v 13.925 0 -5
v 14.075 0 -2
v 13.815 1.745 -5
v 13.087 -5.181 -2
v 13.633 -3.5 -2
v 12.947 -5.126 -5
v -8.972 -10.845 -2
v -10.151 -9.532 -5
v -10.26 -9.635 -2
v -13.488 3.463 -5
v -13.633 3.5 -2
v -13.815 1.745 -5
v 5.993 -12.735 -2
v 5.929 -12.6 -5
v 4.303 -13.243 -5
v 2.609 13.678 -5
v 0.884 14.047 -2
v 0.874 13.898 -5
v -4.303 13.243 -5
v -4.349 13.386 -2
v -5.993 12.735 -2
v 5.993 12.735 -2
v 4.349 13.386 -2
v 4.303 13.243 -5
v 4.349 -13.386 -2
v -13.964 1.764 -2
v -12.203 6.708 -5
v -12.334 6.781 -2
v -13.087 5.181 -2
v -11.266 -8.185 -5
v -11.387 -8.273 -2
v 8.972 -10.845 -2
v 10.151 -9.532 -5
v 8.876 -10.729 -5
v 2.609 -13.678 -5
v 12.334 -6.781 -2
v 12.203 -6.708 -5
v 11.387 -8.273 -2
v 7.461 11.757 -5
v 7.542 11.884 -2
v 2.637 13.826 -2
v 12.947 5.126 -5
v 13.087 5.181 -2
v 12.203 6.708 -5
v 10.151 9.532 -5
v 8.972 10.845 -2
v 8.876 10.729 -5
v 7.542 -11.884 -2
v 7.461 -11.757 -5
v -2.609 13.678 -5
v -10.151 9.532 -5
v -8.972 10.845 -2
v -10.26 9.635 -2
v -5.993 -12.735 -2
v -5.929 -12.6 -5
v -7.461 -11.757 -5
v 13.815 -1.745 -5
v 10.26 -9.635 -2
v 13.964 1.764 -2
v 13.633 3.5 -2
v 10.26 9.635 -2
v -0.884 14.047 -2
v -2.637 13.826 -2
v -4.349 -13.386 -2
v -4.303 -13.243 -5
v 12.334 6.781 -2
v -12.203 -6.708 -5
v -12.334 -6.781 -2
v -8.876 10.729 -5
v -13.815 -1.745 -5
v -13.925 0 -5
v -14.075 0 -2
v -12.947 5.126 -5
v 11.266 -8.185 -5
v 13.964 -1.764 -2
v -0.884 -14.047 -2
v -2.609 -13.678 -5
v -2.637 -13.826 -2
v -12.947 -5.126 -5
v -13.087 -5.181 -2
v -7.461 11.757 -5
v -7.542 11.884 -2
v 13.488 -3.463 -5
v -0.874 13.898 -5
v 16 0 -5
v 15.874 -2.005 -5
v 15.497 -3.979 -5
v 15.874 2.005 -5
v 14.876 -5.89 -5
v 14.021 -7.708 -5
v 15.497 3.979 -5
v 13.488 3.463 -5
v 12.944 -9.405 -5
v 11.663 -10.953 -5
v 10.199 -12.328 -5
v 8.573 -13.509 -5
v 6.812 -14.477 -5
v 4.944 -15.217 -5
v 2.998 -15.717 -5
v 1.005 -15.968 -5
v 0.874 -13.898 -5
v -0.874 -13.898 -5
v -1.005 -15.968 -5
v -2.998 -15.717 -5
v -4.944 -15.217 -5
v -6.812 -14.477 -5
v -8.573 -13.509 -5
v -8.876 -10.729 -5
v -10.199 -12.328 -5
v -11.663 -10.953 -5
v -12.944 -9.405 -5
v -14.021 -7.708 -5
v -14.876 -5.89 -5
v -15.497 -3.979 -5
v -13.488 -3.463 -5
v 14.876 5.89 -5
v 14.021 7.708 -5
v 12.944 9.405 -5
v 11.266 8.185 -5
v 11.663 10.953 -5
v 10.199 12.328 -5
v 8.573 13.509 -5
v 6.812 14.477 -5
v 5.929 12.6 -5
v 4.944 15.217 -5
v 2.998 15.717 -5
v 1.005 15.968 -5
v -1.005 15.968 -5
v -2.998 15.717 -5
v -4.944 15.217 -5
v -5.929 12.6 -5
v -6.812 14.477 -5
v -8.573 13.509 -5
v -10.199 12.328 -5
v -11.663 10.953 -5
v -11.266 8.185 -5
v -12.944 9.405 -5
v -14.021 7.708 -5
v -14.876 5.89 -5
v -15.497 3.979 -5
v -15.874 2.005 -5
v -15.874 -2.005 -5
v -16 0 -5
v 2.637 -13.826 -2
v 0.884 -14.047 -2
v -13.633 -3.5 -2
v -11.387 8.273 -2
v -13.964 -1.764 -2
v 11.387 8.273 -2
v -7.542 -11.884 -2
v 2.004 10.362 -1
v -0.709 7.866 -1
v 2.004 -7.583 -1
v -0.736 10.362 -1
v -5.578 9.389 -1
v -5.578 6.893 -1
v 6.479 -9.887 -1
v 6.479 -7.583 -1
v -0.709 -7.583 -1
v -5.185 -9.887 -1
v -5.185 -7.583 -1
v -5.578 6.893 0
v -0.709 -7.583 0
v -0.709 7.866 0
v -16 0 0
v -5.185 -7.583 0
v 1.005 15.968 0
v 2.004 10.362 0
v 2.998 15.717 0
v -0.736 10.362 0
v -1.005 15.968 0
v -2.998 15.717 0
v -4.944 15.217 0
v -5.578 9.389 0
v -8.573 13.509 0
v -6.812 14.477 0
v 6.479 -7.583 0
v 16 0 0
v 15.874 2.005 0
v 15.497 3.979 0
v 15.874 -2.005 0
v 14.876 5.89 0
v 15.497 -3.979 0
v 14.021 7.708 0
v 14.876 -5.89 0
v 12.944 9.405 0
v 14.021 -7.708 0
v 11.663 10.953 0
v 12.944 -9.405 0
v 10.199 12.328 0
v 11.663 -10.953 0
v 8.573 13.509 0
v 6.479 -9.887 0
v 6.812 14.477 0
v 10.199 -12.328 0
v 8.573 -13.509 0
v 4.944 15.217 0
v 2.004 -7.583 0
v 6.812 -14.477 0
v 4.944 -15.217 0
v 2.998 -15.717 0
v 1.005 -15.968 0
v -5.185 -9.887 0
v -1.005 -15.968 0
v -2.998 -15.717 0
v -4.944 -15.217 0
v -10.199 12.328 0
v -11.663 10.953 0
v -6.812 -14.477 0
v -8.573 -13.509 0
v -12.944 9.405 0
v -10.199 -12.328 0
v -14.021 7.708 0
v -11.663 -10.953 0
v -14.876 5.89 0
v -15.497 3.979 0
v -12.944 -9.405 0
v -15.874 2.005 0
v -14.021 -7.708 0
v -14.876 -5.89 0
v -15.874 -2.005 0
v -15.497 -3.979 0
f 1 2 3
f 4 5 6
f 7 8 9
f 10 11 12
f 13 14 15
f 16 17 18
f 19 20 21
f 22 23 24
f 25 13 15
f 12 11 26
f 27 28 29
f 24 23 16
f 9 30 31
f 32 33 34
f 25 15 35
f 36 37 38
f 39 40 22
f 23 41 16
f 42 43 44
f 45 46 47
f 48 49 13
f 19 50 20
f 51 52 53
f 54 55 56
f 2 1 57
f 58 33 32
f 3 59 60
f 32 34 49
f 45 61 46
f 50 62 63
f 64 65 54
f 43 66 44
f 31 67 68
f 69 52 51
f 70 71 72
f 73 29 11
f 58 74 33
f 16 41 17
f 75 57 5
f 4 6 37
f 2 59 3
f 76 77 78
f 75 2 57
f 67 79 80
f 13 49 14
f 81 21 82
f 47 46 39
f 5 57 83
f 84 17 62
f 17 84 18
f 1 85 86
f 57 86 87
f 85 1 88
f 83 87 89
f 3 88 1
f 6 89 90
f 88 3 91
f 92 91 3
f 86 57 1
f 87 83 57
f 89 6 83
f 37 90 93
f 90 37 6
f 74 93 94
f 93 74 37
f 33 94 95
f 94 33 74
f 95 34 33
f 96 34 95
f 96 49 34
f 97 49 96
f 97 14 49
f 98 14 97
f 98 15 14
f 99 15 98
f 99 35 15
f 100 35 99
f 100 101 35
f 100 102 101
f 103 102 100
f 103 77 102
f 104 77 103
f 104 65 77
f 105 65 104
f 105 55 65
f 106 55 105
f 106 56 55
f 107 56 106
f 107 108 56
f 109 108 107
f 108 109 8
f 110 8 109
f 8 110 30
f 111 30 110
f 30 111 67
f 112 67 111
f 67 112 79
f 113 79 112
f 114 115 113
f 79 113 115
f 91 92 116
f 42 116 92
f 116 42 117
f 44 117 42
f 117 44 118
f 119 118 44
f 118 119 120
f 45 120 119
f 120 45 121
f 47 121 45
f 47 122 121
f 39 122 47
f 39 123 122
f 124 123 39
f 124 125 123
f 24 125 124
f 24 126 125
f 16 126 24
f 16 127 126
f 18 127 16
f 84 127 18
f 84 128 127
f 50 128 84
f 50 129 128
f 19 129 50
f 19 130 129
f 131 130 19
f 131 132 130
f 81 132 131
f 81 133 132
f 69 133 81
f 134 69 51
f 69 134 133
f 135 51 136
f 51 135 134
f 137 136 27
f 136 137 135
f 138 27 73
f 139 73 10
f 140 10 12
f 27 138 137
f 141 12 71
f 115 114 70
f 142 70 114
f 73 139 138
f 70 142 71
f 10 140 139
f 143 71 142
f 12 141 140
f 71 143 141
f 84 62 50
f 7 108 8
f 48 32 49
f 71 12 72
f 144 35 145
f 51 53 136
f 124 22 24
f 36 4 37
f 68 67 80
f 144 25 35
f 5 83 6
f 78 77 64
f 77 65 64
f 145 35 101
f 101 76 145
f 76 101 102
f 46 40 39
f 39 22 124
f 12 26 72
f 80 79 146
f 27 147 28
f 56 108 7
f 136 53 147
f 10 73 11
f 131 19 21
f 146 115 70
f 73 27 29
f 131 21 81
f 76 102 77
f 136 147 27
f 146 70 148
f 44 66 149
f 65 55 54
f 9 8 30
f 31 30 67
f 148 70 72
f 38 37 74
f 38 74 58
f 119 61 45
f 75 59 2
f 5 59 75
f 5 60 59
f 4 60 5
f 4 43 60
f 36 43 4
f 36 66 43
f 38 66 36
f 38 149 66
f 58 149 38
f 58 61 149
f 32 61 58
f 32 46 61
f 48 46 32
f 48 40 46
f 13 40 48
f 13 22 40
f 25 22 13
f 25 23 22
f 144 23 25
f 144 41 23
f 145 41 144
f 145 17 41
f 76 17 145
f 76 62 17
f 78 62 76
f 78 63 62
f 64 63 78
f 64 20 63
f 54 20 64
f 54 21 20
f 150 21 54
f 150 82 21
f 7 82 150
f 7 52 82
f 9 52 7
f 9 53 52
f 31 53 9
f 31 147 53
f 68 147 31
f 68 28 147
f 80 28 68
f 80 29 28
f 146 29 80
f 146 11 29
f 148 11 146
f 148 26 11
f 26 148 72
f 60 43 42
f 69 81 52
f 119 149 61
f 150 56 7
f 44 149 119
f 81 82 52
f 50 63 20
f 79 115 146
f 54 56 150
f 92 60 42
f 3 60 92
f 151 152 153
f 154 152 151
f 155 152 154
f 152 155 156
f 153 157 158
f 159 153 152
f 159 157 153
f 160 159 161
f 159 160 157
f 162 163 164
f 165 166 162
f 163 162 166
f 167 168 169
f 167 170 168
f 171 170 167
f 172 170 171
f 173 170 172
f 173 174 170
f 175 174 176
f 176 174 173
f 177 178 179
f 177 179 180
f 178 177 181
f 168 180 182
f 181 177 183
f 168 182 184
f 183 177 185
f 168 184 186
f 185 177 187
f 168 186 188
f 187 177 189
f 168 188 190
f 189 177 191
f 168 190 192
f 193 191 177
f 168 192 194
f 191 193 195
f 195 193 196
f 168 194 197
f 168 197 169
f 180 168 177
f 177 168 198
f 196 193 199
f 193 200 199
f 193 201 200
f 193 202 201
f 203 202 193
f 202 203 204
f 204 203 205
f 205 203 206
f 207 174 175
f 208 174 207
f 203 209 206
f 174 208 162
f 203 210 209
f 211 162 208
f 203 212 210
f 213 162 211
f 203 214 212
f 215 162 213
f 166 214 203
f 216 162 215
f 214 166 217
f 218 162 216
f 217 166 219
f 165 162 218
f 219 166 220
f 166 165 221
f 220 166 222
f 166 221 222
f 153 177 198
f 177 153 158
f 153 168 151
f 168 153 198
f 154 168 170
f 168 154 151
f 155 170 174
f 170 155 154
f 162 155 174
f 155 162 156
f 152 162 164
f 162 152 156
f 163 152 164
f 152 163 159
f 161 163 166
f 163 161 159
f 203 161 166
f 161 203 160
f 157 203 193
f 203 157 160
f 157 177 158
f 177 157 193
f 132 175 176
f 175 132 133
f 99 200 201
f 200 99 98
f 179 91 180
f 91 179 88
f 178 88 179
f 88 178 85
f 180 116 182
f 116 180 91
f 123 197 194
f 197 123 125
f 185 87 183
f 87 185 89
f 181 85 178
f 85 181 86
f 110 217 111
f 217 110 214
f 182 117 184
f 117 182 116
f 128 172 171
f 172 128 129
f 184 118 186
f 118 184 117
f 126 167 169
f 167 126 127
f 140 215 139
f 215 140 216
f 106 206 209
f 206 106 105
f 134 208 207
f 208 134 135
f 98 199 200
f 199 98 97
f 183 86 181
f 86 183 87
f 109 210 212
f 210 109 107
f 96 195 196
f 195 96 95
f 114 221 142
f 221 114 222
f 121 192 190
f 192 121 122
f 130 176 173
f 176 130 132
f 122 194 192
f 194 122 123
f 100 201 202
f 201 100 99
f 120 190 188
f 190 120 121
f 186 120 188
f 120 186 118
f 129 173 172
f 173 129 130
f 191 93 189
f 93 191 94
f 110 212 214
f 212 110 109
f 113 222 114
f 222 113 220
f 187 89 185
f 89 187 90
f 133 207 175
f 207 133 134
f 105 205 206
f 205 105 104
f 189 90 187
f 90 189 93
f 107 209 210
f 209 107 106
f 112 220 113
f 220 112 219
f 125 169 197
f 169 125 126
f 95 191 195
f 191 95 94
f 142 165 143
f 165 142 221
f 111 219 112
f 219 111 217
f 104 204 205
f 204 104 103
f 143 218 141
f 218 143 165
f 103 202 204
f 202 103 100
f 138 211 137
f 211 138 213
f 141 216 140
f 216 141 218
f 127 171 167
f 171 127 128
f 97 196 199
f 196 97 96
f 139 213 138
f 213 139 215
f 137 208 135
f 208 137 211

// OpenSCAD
$fn = 50;


difference() {
	union() {
		translate(v = [0, 0, -5.0000000000]) {
			cylinder(h = 5, r = 16.0000000000);
		}
	}
	union() {
		#translate(v = [0, 0, -5.0000000000]) {
			cylinder(h = 3, r1 = 13.9250000000, r2 = 14.0750000000);
		}
		translate(v = [0, 0, -1]) {
			linear_extrude(height = 1) {
				text(font = "Impact", halign = "center", size = 20, text = "1", valign = "center");
			}
		}
	}
}
